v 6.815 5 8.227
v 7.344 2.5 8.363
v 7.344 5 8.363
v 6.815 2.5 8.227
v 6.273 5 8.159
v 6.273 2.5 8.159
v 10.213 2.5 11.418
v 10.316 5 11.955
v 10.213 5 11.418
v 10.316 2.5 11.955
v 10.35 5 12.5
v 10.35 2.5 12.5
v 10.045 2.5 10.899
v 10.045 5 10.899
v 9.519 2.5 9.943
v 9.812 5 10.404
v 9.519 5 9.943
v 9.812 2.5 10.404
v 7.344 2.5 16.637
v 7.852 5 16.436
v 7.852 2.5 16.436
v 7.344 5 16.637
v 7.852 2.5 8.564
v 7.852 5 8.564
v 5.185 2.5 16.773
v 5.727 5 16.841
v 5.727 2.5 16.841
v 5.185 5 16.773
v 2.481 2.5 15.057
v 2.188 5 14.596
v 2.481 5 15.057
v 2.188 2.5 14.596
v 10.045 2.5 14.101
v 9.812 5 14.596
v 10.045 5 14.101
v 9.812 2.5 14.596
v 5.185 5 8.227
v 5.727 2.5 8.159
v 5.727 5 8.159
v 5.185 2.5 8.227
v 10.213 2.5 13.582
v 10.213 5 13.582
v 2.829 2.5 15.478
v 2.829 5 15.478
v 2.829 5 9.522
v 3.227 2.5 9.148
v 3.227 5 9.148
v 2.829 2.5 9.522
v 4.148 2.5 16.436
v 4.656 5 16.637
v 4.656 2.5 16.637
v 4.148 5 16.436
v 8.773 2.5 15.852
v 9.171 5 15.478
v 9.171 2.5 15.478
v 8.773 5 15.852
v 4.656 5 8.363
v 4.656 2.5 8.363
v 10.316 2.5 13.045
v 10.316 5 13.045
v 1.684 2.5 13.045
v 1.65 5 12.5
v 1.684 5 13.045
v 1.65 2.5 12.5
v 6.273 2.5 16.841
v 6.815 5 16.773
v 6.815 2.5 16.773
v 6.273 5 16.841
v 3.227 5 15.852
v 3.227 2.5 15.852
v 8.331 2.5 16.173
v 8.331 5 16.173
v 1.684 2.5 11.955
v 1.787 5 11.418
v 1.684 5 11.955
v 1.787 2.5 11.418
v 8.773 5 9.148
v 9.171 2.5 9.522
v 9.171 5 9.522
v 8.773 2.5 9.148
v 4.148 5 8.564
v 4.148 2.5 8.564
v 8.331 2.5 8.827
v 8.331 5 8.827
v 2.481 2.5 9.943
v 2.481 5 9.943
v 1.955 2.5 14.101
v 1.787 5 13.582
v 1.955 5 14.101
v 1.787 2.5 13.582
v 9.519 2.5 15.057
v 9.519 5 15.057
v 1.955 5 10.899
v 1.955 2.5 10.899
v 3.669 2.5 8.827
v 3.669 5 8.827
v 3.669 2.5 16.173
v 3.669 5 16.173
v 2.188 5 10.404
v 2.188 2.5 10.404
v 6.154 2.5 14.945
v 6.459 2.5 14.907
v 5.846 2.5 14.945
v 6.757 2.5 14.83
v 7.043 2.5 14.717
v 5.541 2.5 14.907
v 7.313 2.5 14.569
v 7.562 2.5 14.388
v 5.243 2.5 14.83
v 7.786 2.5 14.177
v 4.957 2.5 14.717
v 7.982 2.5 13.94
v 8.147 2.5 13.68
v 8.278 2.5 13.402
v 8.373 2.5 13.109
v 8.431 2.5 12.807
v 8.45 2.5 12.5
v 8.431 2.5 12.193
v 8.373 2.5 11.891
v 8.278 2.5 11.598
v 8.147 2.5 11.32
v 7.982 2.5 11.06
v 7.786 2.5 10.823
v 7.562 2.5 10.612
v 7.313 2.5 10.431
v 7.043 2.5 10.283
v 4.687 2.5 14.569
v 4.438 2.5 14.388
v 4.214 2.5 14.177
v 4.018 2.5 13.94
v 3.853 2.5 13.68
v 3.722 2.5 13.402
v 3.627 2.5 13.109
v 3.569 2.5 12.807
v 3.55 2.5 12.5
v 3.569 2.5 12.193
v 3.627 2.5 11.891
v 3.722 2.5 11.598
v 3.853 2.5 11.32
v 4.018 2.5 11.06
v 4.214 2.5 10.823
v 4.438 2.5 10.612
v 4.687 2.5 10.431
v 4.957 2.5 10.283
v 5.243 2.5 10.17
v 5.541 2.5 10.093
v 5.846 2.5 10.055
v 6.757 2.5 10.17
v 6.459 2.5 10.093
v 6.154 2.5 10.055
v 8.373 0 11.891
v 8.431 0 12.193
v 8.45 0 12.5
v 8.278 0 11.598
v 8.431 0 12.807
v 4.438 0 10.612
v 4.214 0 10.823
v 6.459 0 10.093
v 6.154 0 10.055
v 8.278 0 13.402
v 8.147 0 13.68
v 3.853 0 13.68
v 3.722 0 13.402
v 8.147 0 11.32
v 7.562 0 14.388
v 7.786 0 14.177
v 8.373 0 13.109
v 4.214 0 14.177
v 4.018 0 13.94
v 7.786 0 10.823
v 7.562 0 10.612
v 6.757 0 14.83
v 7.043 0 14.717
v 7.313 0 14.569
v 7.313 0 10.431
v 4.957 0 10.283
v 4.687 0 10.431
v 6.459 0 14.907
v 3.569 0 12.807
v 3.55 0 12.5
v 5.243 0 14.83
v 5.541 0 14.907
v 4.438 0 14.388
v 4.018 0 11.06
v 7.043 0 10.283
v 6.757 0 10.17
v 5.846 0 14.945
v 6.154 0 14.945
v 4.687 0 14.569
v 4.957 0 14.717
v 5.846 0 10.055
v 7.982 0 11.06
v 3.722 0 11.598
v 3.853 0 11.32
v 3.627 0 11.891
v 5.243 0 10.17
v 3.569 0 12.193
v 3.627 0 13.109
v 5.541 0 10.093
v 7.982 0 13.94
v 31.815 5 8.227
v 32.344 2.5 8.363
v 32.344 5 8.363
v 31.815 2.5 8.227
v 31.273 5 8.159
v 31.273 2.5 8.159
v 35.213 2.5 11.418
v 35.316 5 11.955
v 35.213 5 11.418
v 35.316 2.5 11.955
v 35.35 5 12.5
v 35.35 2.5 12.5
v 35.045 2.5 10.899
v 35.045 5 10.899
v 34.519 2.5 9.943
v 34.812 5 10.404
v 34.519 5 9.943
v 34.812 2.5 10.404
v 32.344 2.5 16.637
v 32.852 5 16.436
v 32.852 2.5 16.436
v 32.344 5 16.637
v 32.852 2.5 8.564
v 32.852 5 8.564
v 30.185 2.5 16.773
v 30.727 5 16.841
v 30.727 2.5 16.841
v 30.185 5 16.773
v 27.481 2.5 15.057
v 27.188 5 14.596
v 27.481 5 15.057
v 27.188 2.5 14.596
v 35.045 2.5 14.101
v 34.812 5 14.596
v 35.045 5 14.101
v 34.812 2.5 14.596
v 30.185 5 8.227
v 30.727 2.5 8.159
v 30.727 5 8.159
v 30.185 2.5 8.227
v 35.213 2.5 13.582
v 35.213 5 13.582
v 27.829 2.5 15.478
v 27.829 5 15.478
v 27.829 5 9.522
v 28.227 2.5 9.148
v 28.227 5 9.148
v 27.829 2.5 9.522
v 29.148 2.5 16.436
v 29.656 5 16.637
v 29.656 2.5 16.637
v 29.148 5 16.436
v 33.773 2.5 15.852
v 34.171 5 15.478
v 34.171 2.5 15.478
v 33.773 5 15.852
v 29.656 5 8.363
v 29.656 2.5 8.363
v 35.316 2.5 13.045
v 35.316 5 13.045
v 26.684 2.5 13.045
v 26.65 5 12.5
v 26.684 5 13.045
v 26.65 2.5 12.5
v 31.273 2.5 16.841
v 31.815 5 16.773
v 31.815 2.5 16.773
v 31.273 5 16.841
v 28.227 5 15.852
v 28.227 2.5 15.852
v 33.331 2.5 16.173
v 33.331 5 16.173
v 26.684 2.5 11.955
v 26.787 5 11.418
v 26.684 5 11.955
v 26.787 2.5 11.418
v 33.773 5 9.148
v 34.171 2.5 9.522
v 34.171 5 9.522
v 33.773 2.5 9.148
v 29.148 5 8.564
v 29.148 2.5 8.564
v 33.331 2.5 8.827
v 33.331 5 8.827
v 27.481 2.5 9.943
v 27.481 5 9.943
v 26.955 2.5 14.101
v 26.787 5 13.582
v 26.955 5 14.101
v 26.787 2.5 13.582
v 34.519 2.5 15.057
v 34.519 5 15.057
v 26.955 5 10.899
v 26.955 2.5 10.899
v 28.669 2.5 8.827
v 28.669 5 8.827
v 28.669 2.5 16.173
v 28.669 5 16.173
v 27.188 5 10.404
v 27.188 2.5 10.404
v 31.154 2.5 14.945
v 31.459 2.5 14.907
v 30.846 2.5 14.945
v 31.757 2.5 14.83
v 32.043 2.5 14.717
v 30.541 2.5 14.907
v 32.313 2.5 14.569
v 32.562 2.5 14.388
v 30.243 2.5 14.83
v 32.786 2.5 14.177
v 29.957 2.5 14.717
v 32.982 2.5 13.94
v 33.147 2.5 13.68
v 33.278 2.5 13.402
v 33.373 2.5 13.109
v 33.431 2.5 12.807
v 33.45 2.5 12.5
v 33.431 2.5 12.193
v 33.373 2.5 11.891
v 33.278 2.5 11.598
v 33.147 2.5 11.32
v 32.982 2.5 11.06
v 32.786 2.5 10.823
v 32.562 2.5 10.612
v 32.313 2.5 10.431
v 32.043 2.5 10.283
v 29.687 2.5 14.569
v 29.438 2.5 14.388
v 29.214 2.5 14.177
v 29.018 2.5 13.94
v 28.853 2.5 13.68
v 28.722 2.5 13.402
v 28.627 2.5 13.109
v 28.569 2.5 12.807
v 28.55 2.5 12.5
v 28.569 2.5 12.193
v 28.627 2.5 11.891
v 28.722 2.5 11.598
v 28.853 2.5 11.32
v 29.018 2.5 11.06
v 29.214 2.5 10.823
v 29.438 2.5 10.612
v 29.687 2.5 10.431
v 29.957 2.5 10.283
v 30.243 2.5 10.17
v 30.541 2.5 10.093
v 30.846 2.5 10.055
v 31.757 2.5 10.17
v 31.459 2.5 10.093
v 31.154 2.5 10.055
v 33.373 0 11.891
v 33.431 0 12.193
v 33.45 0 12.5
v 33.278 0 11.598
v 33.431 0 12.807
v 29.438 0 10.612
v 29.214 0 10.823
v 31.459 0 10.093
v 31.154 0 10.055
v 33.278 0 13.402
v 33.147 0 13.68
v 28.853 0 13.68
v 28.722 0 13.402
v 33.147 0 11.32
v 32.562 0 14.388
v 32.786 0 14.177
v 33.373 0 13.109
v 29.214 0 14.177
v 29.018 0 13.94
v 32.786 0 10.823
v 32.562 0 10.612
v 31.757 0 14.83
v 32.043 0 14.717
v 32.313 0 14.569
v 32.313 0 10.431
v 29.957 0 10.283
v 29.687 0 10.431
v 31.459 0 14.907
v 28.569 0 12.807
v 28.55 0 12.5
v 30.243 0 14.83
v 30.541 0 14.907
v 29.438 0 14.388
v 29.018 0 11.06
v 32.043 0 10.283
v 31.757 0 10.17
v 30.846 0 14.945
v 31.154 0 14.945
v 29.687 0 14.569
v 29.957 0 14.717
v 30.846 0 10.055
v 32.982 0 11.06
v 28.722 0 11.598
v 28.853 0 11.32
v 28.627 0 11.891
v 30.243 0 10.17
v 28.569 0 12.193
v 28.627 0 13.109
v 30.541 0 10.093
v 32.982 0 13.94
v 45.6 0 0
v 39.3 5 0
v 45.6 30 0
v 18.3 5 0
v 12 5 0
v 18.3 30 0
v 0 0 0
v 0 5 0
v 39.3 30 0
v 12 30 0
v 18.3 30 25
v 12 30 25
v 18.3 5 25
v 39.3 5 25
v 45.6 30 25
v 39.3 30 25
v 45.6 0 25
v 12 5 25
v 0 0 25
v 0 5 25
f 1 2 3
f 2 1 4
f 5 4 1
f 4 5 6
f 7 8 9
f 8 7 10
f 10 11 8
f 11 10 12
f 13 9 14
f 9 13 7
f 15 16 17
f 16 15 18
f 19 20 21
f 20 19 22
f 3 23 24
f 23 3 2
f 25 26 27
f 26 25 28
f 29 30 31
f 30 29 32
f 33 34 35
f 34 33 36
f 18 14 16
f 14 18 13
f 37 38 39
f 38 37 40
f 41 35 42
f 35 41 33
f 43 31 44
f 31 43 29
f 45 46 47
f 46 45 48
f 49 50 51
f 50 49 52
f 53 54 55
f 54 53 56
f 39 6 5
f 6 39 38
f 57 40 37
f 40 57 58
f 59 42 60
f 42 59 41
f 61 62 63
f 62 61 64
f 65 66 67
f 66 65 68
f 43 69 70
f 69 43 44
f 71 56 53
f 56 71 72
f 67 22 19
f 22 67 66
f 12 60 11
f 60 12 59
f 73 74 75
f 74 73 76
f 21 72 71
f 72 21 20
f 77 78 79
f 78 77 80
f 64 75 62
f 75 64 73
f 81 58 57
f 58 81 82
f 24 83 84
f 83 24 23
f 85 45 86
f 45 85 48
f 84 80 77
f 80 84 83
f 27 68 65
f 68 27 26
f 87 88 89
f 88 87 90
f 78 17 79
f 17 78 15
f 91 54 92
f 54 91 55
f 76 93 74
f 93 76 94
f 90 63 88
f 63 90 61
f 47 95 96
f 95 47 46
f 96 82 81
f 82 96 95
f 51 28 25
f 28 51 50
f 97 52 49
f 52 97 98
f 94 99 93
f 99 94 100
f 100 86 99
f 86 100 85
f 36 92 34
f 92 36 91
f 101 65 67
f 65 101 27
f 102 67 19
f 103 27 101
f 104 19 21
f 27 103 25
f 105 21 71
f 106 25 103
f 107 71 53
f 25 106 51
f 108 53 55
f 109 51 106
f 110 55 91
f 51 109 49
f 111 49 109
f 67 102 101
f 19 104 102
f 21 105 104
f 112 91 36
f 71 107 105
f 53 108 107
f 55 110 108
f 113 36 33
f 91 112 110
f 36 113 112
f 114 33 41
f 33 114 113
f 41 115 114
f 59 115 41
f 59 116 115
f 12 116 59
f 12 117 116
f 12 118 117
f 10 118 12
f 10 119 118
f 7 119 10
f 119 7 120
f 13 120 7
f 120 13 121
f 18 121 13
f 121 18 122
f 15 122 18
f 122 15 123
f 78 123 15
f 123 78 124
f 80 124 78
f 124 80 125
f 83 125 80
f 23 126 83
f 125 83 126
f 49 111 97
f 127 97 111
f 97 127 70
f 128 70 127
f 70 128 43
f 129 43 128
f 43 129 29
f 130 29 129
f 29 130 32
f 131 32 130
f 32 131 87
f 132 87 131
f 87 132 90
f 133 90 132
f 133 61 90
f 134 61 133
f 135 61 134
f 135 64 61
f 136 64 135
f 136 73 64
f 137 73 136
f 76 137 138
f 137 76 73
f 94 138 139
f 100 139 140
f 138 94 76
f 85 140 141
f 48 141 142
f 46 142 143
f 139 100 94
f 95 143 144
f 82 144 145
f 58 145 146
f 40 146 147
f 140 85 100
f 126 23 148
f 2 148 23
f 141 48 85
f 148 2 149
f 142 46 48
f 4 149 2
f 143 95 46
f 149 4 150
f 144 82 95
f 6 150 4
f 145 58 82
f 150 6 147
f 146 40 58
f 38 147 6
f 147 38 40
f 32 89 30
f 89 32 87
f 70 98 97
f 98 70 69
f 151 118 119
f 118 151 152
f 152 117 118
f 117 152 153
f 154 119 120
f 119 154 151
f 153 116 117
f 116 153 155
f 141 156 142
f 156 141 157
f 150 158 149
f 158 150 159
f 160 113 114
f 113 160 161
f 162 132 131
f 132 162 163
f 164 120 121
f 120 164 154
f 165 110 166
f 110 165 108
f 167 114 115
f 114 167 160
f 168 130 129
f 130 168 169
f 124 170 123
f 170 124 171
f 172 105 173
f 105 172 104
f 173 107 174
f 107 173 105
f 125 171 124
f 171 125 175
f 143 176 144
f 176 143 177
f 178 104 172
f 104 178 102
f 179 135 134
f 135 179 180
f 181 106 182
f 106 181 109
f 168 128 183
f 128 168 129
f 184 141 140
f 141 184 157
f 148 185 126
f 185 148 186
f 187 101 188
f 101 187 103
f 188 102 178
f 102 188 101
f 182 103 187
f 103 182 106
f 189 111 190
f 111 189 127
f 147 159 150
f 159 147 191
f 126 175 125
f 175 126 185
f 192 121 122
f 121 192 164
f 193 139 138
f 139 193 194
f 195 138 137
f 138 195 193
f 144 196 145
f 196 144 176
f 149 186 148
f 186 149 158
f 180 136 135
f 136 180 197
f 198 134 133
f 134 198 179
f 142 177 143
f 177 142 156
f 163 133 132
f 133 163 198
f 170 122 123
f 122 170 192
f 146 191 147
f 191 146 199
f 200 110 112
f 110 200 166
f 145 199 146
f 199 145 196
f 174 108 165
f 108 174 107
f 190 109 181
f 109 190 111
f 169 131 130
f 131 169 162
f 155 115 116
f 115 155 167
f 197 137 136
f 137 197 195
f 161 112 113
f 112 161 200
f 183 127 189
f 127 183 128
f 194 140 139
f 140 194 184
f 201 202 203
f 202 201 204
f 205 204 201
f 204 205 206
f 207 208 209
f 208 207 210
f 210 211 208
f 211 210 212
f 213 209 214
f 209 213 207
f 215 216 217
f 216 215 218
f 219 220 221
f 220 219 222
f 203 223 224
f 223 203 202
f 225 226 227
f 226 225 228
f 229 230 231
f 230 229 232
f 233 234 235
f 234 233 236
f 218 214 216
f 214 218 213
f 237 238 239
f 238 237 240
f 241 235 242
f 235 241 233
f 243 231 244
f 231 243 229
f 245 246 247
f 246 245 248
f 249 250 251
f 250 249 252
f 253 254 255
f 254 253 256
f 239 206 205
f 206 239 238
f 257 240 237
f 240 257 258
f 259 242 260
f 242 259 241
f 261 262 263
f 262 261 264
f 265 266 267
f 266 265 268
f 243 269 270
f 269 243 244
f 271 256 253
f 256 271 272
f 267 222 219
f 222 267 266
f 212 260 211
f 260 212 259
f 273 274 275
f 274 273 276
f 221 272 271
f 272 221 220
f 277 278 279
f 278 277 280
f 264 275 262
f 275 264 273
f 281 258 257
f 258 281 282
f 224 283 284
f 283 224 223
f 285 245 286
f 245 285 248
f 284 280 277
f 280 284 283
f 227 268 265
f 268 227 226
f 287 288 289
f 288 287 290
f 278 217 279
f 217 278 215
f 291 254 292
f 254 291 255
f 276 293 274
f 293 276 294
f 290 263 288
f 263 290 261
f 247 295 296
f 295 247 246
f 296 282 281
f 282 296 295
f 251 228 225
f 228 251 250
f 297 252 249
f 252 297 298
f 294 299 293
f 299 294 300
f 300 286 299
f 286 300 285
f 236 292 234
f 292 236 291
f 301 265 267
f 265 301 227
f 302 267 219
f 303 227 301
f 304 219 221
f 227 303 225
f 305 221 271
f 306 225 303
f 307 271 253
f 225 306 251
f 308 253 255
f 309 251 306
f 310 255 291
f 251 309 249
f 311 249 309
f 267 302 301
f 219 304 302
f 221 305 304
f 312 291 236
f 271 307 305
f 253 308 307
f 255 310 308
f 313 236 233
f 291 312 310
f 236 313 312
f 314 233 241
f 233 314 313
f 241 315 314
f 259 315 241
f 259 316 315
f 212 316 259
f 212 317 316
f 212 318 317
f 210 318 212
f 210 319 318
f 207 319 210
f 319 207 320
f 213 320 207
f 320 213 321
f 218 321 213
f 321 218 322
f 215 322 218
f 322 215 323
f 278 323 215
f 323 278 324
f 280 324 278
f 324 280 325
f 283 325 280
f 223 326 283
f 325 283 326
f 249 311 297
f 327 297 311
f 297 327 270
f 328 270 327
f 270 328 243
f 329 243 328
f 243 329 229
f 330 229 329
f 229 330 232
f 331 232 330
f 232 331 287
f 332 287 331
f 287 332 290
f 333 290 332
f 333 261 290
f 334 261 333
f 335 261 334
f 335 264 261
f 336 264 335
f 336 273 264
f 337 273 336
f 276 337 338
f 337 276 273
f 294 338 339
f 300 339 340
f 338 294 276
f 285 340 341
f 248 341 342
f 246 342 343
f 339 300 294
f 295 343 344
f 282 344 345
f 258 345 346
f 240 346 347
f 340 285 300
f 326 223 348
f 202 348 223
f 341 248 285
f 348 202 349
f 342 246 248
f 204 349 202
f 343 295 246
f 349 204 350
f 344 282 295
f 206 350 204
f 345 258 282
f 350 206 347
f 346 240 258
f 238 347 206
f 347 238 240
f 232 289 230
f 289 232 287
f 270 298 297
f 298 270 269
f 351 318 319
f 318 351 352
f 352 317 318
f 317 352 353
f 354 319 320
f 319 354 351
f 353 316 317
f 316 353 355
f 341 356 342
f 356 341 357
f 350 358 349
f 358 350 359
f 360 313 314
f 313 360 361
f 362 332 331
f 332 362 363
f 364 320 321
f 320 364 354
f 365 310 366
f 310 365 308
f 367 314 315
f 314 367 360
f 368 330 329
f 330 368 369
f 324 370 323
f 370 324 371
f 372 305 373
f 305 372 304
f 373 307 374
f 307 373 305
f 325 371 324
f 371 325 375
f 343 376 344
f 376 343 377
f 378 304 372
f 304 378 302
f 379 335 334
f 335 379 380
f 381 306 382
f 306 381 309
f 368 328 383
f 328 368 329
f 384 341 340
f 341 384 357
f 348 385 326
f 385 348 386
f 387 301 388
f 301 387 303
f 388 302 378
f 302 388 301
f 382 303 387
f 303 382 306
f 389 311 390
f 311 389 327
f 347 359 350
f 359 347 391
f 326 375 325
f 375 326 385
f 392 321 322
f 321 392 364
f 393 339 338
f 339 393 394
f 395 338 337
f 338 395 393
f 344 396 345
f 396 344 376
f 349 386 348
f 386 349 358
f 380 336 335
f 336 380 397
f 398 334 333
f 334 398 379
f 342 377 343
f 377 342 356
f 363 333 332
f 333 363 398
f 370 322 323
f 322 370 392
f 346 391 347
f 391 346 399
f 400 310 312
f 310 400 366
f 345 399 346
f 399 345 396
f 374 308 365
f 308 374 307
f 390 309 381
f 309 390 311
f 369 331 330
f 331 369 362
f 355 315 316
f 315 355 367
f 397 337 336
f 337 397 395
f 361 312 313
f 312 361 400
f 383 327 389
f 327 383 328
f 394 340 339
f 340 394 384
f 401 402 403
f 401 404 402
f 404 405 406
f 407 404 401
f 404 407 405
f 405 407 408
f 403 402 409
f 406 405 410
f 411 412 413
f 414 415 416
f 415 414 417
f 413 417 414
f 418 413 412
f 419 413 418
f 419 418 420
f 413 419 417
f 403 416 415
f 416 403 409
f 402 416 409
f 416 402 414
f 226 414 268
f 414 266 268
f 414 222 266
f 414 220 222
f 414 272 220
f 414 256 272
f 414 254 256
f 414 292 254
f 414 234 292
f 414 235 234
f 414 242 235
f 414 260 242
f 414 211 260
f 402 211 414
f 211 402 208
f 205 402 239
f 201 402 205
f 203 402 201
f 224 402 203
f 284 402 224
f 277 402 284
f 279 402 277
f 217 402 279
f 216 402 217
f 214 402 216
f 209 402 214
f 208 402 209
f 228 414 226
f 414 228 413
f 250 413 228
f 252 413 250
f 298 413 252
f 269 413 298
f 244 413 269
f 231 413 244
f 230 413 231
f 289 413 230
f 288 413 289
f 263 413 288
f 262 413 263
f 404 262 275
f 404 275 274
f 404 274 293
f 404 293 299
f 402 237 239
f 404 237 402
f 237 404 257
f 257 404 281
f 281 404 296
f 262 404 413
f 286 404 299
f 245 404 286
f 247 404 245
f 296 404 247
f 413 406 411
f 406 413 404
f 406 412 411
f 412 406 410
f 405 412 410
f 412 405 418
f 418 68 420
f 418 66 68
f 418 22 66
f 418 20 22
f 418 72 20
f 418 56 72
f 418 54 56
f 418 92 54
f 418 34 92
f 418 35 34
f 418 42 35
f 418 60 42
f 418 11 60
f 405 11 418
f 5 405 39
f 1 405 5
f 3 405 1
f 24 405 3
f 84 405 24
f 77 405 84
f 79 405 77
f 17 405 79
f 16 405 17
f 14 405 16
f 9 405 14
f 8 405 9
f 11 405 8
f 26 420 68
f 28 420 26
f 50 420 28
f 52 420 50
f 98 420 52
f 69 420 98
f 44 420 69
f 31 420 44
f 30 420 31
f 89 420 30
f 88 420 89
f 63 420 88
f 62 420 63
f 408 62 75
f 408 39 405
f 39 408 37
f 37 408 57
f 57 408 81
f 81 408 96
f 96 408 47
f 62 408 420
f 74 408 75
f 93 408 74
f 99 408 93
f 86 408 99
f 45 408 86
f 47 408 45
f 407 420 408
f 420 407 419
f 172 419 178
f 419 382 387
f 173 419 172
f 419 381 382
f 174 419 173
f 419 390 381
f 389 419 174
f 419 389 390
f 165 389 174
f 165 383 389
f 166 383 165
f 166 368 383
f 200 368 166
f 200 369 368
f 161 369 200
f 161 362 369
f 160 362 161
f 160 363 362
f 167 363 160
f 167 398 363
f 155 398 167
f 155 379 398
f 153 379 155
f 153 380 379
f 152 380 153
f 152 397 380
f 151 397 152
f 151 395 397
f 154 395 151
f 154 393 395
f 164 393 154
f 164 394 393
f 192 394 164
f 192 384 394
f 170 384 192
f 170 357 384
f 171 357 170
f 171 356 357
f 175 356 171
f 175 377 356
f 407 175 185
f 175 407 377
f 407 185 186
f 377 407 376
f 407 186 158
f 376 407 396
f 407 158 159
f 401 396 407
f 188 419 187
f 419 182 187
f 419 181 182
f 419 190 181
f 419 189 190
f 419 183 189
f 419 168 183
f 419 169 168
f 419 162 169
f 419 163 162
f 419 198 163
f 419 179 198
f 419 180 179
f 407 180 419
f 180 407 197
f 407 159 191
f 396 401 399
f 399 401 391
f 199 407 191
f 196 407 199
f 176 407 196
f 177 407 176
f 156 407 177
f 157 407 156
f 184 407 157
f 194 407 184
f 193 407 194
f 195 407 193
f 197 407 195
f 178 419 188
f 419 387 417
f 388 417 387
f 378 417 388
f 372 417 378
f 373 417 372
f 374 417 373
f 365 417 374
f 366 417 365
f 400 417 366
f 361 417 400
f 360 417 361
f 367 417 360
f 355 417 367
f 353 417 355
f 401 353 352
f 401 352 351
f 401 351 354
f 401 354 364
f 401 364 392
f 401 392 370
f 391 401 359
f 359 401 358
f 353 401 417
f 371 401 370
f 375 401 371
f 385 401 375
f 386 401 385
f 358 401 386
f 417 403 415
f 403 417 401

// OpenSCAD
$fn = 50;

a = 44;
b = 25;
c = 5;
d = 30;
e = 12;
f = 21;
g = 6.3;
h = 8.7/2;
i = 4.9/2;
fudge_factor_for_second_screw_hole = 7;

difference()
{
	color("grey") linear_extrude(height = b) union()
	{
		square(size = [a, c]);
		translate([e, 0]) square(size = [g, d]);
		translate([e+g+f, 0]) square(size = [g, d]);
		/*translate([e+g+f+g+f, c]) square(size = [g, d]);*/
	}

	color("red") translate([e/2, c/2, b/2]) rotate([-90, 0, 0]) union()
	{
		cylinder(r = h, h = c);
		translate([0,0,-c]) cylinder(r = i, h = c);
	}

	color("orange") translate([a - e/2 - fudge_factor_for_second_screw_hole, c/2, b/2]) rotate([-90, 0, 0]) union()
	{
		cylinder(r = h, h = c);
		translate([0,0,-c]) cylinder(r = i, h = c);
	}
}
